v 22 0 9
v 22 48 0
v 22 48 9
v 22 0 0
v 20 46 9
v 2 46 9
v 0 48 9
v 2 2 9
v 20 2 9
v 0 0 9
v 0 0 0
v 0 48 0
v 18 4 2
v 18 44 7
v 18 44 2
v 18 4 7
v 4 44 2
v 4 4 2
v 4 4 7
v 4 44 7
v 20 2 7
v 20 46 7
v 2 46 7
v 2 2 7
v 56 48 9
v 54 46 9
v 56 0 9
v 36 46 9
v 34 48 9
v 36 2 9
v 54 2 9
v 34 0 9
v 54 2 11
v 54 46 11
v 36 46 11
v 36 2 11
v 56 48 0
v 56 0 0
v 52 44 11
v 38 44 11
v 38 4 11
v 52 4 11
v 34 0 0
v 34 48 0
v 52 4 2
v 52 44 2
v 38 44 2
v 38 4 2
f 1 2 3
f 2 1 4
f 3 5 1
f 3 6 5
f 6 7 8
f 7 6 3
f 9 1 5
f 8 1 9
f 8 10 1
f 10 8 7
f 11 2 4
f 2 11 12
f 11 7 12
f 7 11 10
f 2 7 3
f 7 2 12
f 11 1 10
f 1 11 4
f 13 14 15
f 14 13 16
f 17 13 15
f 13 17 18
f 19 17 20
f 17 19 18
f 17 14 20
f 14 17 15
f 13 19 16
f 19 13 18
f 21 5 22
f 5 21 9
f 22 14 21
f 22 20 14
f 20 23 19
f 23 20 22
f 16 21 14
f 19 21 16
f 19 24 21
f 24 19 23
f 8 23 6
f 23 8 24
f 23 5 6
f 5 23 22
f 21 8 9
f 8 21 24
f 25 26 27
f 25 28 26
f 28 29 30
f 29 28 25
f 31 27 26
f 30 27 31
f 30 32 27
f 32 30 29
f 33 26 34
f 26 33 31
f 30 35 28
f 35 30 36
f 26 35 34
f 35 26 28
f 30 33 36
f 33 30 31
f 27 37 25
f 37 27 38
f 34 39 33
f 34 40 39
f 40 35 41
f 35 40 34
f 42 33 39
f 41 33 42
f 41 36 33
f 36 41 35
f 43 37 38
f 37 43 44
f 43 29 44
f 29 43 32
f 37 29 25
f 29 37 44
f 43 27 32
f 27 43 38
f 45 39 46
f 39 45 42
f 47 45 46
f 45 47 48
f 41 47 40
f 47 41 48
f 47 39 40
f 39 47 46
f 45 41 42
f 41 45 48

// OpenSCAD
//CUSTOMIZER VARIABLES

// Internal X measurement in mm.
x = 14;
// Internal Y measurement in mm.
y = 40;
// Internal Z measurement in mm.
z = 14;
//CUSTOMIZER VARIABLES END


difference(){
cube([x+8,y+8,(z/2)+2]);
translate([4,4,2])cube([x,y,(z/2)+1]);
translate([2,2,z/2])cube([x+4,y+4,3]);
}
translate([x+20,0,0])
difference(){
cube([x+8,y+8,(z/2)+4]);
translate([4,4,2])cube([x,y,(z/2)+3]);

difference(){
translate([-1,-1,(z/2)+2])cube([x+12,y+12,3]);
translate([2,2,(z/2)+2])cube([x+4,y+4,6]);
}
}
